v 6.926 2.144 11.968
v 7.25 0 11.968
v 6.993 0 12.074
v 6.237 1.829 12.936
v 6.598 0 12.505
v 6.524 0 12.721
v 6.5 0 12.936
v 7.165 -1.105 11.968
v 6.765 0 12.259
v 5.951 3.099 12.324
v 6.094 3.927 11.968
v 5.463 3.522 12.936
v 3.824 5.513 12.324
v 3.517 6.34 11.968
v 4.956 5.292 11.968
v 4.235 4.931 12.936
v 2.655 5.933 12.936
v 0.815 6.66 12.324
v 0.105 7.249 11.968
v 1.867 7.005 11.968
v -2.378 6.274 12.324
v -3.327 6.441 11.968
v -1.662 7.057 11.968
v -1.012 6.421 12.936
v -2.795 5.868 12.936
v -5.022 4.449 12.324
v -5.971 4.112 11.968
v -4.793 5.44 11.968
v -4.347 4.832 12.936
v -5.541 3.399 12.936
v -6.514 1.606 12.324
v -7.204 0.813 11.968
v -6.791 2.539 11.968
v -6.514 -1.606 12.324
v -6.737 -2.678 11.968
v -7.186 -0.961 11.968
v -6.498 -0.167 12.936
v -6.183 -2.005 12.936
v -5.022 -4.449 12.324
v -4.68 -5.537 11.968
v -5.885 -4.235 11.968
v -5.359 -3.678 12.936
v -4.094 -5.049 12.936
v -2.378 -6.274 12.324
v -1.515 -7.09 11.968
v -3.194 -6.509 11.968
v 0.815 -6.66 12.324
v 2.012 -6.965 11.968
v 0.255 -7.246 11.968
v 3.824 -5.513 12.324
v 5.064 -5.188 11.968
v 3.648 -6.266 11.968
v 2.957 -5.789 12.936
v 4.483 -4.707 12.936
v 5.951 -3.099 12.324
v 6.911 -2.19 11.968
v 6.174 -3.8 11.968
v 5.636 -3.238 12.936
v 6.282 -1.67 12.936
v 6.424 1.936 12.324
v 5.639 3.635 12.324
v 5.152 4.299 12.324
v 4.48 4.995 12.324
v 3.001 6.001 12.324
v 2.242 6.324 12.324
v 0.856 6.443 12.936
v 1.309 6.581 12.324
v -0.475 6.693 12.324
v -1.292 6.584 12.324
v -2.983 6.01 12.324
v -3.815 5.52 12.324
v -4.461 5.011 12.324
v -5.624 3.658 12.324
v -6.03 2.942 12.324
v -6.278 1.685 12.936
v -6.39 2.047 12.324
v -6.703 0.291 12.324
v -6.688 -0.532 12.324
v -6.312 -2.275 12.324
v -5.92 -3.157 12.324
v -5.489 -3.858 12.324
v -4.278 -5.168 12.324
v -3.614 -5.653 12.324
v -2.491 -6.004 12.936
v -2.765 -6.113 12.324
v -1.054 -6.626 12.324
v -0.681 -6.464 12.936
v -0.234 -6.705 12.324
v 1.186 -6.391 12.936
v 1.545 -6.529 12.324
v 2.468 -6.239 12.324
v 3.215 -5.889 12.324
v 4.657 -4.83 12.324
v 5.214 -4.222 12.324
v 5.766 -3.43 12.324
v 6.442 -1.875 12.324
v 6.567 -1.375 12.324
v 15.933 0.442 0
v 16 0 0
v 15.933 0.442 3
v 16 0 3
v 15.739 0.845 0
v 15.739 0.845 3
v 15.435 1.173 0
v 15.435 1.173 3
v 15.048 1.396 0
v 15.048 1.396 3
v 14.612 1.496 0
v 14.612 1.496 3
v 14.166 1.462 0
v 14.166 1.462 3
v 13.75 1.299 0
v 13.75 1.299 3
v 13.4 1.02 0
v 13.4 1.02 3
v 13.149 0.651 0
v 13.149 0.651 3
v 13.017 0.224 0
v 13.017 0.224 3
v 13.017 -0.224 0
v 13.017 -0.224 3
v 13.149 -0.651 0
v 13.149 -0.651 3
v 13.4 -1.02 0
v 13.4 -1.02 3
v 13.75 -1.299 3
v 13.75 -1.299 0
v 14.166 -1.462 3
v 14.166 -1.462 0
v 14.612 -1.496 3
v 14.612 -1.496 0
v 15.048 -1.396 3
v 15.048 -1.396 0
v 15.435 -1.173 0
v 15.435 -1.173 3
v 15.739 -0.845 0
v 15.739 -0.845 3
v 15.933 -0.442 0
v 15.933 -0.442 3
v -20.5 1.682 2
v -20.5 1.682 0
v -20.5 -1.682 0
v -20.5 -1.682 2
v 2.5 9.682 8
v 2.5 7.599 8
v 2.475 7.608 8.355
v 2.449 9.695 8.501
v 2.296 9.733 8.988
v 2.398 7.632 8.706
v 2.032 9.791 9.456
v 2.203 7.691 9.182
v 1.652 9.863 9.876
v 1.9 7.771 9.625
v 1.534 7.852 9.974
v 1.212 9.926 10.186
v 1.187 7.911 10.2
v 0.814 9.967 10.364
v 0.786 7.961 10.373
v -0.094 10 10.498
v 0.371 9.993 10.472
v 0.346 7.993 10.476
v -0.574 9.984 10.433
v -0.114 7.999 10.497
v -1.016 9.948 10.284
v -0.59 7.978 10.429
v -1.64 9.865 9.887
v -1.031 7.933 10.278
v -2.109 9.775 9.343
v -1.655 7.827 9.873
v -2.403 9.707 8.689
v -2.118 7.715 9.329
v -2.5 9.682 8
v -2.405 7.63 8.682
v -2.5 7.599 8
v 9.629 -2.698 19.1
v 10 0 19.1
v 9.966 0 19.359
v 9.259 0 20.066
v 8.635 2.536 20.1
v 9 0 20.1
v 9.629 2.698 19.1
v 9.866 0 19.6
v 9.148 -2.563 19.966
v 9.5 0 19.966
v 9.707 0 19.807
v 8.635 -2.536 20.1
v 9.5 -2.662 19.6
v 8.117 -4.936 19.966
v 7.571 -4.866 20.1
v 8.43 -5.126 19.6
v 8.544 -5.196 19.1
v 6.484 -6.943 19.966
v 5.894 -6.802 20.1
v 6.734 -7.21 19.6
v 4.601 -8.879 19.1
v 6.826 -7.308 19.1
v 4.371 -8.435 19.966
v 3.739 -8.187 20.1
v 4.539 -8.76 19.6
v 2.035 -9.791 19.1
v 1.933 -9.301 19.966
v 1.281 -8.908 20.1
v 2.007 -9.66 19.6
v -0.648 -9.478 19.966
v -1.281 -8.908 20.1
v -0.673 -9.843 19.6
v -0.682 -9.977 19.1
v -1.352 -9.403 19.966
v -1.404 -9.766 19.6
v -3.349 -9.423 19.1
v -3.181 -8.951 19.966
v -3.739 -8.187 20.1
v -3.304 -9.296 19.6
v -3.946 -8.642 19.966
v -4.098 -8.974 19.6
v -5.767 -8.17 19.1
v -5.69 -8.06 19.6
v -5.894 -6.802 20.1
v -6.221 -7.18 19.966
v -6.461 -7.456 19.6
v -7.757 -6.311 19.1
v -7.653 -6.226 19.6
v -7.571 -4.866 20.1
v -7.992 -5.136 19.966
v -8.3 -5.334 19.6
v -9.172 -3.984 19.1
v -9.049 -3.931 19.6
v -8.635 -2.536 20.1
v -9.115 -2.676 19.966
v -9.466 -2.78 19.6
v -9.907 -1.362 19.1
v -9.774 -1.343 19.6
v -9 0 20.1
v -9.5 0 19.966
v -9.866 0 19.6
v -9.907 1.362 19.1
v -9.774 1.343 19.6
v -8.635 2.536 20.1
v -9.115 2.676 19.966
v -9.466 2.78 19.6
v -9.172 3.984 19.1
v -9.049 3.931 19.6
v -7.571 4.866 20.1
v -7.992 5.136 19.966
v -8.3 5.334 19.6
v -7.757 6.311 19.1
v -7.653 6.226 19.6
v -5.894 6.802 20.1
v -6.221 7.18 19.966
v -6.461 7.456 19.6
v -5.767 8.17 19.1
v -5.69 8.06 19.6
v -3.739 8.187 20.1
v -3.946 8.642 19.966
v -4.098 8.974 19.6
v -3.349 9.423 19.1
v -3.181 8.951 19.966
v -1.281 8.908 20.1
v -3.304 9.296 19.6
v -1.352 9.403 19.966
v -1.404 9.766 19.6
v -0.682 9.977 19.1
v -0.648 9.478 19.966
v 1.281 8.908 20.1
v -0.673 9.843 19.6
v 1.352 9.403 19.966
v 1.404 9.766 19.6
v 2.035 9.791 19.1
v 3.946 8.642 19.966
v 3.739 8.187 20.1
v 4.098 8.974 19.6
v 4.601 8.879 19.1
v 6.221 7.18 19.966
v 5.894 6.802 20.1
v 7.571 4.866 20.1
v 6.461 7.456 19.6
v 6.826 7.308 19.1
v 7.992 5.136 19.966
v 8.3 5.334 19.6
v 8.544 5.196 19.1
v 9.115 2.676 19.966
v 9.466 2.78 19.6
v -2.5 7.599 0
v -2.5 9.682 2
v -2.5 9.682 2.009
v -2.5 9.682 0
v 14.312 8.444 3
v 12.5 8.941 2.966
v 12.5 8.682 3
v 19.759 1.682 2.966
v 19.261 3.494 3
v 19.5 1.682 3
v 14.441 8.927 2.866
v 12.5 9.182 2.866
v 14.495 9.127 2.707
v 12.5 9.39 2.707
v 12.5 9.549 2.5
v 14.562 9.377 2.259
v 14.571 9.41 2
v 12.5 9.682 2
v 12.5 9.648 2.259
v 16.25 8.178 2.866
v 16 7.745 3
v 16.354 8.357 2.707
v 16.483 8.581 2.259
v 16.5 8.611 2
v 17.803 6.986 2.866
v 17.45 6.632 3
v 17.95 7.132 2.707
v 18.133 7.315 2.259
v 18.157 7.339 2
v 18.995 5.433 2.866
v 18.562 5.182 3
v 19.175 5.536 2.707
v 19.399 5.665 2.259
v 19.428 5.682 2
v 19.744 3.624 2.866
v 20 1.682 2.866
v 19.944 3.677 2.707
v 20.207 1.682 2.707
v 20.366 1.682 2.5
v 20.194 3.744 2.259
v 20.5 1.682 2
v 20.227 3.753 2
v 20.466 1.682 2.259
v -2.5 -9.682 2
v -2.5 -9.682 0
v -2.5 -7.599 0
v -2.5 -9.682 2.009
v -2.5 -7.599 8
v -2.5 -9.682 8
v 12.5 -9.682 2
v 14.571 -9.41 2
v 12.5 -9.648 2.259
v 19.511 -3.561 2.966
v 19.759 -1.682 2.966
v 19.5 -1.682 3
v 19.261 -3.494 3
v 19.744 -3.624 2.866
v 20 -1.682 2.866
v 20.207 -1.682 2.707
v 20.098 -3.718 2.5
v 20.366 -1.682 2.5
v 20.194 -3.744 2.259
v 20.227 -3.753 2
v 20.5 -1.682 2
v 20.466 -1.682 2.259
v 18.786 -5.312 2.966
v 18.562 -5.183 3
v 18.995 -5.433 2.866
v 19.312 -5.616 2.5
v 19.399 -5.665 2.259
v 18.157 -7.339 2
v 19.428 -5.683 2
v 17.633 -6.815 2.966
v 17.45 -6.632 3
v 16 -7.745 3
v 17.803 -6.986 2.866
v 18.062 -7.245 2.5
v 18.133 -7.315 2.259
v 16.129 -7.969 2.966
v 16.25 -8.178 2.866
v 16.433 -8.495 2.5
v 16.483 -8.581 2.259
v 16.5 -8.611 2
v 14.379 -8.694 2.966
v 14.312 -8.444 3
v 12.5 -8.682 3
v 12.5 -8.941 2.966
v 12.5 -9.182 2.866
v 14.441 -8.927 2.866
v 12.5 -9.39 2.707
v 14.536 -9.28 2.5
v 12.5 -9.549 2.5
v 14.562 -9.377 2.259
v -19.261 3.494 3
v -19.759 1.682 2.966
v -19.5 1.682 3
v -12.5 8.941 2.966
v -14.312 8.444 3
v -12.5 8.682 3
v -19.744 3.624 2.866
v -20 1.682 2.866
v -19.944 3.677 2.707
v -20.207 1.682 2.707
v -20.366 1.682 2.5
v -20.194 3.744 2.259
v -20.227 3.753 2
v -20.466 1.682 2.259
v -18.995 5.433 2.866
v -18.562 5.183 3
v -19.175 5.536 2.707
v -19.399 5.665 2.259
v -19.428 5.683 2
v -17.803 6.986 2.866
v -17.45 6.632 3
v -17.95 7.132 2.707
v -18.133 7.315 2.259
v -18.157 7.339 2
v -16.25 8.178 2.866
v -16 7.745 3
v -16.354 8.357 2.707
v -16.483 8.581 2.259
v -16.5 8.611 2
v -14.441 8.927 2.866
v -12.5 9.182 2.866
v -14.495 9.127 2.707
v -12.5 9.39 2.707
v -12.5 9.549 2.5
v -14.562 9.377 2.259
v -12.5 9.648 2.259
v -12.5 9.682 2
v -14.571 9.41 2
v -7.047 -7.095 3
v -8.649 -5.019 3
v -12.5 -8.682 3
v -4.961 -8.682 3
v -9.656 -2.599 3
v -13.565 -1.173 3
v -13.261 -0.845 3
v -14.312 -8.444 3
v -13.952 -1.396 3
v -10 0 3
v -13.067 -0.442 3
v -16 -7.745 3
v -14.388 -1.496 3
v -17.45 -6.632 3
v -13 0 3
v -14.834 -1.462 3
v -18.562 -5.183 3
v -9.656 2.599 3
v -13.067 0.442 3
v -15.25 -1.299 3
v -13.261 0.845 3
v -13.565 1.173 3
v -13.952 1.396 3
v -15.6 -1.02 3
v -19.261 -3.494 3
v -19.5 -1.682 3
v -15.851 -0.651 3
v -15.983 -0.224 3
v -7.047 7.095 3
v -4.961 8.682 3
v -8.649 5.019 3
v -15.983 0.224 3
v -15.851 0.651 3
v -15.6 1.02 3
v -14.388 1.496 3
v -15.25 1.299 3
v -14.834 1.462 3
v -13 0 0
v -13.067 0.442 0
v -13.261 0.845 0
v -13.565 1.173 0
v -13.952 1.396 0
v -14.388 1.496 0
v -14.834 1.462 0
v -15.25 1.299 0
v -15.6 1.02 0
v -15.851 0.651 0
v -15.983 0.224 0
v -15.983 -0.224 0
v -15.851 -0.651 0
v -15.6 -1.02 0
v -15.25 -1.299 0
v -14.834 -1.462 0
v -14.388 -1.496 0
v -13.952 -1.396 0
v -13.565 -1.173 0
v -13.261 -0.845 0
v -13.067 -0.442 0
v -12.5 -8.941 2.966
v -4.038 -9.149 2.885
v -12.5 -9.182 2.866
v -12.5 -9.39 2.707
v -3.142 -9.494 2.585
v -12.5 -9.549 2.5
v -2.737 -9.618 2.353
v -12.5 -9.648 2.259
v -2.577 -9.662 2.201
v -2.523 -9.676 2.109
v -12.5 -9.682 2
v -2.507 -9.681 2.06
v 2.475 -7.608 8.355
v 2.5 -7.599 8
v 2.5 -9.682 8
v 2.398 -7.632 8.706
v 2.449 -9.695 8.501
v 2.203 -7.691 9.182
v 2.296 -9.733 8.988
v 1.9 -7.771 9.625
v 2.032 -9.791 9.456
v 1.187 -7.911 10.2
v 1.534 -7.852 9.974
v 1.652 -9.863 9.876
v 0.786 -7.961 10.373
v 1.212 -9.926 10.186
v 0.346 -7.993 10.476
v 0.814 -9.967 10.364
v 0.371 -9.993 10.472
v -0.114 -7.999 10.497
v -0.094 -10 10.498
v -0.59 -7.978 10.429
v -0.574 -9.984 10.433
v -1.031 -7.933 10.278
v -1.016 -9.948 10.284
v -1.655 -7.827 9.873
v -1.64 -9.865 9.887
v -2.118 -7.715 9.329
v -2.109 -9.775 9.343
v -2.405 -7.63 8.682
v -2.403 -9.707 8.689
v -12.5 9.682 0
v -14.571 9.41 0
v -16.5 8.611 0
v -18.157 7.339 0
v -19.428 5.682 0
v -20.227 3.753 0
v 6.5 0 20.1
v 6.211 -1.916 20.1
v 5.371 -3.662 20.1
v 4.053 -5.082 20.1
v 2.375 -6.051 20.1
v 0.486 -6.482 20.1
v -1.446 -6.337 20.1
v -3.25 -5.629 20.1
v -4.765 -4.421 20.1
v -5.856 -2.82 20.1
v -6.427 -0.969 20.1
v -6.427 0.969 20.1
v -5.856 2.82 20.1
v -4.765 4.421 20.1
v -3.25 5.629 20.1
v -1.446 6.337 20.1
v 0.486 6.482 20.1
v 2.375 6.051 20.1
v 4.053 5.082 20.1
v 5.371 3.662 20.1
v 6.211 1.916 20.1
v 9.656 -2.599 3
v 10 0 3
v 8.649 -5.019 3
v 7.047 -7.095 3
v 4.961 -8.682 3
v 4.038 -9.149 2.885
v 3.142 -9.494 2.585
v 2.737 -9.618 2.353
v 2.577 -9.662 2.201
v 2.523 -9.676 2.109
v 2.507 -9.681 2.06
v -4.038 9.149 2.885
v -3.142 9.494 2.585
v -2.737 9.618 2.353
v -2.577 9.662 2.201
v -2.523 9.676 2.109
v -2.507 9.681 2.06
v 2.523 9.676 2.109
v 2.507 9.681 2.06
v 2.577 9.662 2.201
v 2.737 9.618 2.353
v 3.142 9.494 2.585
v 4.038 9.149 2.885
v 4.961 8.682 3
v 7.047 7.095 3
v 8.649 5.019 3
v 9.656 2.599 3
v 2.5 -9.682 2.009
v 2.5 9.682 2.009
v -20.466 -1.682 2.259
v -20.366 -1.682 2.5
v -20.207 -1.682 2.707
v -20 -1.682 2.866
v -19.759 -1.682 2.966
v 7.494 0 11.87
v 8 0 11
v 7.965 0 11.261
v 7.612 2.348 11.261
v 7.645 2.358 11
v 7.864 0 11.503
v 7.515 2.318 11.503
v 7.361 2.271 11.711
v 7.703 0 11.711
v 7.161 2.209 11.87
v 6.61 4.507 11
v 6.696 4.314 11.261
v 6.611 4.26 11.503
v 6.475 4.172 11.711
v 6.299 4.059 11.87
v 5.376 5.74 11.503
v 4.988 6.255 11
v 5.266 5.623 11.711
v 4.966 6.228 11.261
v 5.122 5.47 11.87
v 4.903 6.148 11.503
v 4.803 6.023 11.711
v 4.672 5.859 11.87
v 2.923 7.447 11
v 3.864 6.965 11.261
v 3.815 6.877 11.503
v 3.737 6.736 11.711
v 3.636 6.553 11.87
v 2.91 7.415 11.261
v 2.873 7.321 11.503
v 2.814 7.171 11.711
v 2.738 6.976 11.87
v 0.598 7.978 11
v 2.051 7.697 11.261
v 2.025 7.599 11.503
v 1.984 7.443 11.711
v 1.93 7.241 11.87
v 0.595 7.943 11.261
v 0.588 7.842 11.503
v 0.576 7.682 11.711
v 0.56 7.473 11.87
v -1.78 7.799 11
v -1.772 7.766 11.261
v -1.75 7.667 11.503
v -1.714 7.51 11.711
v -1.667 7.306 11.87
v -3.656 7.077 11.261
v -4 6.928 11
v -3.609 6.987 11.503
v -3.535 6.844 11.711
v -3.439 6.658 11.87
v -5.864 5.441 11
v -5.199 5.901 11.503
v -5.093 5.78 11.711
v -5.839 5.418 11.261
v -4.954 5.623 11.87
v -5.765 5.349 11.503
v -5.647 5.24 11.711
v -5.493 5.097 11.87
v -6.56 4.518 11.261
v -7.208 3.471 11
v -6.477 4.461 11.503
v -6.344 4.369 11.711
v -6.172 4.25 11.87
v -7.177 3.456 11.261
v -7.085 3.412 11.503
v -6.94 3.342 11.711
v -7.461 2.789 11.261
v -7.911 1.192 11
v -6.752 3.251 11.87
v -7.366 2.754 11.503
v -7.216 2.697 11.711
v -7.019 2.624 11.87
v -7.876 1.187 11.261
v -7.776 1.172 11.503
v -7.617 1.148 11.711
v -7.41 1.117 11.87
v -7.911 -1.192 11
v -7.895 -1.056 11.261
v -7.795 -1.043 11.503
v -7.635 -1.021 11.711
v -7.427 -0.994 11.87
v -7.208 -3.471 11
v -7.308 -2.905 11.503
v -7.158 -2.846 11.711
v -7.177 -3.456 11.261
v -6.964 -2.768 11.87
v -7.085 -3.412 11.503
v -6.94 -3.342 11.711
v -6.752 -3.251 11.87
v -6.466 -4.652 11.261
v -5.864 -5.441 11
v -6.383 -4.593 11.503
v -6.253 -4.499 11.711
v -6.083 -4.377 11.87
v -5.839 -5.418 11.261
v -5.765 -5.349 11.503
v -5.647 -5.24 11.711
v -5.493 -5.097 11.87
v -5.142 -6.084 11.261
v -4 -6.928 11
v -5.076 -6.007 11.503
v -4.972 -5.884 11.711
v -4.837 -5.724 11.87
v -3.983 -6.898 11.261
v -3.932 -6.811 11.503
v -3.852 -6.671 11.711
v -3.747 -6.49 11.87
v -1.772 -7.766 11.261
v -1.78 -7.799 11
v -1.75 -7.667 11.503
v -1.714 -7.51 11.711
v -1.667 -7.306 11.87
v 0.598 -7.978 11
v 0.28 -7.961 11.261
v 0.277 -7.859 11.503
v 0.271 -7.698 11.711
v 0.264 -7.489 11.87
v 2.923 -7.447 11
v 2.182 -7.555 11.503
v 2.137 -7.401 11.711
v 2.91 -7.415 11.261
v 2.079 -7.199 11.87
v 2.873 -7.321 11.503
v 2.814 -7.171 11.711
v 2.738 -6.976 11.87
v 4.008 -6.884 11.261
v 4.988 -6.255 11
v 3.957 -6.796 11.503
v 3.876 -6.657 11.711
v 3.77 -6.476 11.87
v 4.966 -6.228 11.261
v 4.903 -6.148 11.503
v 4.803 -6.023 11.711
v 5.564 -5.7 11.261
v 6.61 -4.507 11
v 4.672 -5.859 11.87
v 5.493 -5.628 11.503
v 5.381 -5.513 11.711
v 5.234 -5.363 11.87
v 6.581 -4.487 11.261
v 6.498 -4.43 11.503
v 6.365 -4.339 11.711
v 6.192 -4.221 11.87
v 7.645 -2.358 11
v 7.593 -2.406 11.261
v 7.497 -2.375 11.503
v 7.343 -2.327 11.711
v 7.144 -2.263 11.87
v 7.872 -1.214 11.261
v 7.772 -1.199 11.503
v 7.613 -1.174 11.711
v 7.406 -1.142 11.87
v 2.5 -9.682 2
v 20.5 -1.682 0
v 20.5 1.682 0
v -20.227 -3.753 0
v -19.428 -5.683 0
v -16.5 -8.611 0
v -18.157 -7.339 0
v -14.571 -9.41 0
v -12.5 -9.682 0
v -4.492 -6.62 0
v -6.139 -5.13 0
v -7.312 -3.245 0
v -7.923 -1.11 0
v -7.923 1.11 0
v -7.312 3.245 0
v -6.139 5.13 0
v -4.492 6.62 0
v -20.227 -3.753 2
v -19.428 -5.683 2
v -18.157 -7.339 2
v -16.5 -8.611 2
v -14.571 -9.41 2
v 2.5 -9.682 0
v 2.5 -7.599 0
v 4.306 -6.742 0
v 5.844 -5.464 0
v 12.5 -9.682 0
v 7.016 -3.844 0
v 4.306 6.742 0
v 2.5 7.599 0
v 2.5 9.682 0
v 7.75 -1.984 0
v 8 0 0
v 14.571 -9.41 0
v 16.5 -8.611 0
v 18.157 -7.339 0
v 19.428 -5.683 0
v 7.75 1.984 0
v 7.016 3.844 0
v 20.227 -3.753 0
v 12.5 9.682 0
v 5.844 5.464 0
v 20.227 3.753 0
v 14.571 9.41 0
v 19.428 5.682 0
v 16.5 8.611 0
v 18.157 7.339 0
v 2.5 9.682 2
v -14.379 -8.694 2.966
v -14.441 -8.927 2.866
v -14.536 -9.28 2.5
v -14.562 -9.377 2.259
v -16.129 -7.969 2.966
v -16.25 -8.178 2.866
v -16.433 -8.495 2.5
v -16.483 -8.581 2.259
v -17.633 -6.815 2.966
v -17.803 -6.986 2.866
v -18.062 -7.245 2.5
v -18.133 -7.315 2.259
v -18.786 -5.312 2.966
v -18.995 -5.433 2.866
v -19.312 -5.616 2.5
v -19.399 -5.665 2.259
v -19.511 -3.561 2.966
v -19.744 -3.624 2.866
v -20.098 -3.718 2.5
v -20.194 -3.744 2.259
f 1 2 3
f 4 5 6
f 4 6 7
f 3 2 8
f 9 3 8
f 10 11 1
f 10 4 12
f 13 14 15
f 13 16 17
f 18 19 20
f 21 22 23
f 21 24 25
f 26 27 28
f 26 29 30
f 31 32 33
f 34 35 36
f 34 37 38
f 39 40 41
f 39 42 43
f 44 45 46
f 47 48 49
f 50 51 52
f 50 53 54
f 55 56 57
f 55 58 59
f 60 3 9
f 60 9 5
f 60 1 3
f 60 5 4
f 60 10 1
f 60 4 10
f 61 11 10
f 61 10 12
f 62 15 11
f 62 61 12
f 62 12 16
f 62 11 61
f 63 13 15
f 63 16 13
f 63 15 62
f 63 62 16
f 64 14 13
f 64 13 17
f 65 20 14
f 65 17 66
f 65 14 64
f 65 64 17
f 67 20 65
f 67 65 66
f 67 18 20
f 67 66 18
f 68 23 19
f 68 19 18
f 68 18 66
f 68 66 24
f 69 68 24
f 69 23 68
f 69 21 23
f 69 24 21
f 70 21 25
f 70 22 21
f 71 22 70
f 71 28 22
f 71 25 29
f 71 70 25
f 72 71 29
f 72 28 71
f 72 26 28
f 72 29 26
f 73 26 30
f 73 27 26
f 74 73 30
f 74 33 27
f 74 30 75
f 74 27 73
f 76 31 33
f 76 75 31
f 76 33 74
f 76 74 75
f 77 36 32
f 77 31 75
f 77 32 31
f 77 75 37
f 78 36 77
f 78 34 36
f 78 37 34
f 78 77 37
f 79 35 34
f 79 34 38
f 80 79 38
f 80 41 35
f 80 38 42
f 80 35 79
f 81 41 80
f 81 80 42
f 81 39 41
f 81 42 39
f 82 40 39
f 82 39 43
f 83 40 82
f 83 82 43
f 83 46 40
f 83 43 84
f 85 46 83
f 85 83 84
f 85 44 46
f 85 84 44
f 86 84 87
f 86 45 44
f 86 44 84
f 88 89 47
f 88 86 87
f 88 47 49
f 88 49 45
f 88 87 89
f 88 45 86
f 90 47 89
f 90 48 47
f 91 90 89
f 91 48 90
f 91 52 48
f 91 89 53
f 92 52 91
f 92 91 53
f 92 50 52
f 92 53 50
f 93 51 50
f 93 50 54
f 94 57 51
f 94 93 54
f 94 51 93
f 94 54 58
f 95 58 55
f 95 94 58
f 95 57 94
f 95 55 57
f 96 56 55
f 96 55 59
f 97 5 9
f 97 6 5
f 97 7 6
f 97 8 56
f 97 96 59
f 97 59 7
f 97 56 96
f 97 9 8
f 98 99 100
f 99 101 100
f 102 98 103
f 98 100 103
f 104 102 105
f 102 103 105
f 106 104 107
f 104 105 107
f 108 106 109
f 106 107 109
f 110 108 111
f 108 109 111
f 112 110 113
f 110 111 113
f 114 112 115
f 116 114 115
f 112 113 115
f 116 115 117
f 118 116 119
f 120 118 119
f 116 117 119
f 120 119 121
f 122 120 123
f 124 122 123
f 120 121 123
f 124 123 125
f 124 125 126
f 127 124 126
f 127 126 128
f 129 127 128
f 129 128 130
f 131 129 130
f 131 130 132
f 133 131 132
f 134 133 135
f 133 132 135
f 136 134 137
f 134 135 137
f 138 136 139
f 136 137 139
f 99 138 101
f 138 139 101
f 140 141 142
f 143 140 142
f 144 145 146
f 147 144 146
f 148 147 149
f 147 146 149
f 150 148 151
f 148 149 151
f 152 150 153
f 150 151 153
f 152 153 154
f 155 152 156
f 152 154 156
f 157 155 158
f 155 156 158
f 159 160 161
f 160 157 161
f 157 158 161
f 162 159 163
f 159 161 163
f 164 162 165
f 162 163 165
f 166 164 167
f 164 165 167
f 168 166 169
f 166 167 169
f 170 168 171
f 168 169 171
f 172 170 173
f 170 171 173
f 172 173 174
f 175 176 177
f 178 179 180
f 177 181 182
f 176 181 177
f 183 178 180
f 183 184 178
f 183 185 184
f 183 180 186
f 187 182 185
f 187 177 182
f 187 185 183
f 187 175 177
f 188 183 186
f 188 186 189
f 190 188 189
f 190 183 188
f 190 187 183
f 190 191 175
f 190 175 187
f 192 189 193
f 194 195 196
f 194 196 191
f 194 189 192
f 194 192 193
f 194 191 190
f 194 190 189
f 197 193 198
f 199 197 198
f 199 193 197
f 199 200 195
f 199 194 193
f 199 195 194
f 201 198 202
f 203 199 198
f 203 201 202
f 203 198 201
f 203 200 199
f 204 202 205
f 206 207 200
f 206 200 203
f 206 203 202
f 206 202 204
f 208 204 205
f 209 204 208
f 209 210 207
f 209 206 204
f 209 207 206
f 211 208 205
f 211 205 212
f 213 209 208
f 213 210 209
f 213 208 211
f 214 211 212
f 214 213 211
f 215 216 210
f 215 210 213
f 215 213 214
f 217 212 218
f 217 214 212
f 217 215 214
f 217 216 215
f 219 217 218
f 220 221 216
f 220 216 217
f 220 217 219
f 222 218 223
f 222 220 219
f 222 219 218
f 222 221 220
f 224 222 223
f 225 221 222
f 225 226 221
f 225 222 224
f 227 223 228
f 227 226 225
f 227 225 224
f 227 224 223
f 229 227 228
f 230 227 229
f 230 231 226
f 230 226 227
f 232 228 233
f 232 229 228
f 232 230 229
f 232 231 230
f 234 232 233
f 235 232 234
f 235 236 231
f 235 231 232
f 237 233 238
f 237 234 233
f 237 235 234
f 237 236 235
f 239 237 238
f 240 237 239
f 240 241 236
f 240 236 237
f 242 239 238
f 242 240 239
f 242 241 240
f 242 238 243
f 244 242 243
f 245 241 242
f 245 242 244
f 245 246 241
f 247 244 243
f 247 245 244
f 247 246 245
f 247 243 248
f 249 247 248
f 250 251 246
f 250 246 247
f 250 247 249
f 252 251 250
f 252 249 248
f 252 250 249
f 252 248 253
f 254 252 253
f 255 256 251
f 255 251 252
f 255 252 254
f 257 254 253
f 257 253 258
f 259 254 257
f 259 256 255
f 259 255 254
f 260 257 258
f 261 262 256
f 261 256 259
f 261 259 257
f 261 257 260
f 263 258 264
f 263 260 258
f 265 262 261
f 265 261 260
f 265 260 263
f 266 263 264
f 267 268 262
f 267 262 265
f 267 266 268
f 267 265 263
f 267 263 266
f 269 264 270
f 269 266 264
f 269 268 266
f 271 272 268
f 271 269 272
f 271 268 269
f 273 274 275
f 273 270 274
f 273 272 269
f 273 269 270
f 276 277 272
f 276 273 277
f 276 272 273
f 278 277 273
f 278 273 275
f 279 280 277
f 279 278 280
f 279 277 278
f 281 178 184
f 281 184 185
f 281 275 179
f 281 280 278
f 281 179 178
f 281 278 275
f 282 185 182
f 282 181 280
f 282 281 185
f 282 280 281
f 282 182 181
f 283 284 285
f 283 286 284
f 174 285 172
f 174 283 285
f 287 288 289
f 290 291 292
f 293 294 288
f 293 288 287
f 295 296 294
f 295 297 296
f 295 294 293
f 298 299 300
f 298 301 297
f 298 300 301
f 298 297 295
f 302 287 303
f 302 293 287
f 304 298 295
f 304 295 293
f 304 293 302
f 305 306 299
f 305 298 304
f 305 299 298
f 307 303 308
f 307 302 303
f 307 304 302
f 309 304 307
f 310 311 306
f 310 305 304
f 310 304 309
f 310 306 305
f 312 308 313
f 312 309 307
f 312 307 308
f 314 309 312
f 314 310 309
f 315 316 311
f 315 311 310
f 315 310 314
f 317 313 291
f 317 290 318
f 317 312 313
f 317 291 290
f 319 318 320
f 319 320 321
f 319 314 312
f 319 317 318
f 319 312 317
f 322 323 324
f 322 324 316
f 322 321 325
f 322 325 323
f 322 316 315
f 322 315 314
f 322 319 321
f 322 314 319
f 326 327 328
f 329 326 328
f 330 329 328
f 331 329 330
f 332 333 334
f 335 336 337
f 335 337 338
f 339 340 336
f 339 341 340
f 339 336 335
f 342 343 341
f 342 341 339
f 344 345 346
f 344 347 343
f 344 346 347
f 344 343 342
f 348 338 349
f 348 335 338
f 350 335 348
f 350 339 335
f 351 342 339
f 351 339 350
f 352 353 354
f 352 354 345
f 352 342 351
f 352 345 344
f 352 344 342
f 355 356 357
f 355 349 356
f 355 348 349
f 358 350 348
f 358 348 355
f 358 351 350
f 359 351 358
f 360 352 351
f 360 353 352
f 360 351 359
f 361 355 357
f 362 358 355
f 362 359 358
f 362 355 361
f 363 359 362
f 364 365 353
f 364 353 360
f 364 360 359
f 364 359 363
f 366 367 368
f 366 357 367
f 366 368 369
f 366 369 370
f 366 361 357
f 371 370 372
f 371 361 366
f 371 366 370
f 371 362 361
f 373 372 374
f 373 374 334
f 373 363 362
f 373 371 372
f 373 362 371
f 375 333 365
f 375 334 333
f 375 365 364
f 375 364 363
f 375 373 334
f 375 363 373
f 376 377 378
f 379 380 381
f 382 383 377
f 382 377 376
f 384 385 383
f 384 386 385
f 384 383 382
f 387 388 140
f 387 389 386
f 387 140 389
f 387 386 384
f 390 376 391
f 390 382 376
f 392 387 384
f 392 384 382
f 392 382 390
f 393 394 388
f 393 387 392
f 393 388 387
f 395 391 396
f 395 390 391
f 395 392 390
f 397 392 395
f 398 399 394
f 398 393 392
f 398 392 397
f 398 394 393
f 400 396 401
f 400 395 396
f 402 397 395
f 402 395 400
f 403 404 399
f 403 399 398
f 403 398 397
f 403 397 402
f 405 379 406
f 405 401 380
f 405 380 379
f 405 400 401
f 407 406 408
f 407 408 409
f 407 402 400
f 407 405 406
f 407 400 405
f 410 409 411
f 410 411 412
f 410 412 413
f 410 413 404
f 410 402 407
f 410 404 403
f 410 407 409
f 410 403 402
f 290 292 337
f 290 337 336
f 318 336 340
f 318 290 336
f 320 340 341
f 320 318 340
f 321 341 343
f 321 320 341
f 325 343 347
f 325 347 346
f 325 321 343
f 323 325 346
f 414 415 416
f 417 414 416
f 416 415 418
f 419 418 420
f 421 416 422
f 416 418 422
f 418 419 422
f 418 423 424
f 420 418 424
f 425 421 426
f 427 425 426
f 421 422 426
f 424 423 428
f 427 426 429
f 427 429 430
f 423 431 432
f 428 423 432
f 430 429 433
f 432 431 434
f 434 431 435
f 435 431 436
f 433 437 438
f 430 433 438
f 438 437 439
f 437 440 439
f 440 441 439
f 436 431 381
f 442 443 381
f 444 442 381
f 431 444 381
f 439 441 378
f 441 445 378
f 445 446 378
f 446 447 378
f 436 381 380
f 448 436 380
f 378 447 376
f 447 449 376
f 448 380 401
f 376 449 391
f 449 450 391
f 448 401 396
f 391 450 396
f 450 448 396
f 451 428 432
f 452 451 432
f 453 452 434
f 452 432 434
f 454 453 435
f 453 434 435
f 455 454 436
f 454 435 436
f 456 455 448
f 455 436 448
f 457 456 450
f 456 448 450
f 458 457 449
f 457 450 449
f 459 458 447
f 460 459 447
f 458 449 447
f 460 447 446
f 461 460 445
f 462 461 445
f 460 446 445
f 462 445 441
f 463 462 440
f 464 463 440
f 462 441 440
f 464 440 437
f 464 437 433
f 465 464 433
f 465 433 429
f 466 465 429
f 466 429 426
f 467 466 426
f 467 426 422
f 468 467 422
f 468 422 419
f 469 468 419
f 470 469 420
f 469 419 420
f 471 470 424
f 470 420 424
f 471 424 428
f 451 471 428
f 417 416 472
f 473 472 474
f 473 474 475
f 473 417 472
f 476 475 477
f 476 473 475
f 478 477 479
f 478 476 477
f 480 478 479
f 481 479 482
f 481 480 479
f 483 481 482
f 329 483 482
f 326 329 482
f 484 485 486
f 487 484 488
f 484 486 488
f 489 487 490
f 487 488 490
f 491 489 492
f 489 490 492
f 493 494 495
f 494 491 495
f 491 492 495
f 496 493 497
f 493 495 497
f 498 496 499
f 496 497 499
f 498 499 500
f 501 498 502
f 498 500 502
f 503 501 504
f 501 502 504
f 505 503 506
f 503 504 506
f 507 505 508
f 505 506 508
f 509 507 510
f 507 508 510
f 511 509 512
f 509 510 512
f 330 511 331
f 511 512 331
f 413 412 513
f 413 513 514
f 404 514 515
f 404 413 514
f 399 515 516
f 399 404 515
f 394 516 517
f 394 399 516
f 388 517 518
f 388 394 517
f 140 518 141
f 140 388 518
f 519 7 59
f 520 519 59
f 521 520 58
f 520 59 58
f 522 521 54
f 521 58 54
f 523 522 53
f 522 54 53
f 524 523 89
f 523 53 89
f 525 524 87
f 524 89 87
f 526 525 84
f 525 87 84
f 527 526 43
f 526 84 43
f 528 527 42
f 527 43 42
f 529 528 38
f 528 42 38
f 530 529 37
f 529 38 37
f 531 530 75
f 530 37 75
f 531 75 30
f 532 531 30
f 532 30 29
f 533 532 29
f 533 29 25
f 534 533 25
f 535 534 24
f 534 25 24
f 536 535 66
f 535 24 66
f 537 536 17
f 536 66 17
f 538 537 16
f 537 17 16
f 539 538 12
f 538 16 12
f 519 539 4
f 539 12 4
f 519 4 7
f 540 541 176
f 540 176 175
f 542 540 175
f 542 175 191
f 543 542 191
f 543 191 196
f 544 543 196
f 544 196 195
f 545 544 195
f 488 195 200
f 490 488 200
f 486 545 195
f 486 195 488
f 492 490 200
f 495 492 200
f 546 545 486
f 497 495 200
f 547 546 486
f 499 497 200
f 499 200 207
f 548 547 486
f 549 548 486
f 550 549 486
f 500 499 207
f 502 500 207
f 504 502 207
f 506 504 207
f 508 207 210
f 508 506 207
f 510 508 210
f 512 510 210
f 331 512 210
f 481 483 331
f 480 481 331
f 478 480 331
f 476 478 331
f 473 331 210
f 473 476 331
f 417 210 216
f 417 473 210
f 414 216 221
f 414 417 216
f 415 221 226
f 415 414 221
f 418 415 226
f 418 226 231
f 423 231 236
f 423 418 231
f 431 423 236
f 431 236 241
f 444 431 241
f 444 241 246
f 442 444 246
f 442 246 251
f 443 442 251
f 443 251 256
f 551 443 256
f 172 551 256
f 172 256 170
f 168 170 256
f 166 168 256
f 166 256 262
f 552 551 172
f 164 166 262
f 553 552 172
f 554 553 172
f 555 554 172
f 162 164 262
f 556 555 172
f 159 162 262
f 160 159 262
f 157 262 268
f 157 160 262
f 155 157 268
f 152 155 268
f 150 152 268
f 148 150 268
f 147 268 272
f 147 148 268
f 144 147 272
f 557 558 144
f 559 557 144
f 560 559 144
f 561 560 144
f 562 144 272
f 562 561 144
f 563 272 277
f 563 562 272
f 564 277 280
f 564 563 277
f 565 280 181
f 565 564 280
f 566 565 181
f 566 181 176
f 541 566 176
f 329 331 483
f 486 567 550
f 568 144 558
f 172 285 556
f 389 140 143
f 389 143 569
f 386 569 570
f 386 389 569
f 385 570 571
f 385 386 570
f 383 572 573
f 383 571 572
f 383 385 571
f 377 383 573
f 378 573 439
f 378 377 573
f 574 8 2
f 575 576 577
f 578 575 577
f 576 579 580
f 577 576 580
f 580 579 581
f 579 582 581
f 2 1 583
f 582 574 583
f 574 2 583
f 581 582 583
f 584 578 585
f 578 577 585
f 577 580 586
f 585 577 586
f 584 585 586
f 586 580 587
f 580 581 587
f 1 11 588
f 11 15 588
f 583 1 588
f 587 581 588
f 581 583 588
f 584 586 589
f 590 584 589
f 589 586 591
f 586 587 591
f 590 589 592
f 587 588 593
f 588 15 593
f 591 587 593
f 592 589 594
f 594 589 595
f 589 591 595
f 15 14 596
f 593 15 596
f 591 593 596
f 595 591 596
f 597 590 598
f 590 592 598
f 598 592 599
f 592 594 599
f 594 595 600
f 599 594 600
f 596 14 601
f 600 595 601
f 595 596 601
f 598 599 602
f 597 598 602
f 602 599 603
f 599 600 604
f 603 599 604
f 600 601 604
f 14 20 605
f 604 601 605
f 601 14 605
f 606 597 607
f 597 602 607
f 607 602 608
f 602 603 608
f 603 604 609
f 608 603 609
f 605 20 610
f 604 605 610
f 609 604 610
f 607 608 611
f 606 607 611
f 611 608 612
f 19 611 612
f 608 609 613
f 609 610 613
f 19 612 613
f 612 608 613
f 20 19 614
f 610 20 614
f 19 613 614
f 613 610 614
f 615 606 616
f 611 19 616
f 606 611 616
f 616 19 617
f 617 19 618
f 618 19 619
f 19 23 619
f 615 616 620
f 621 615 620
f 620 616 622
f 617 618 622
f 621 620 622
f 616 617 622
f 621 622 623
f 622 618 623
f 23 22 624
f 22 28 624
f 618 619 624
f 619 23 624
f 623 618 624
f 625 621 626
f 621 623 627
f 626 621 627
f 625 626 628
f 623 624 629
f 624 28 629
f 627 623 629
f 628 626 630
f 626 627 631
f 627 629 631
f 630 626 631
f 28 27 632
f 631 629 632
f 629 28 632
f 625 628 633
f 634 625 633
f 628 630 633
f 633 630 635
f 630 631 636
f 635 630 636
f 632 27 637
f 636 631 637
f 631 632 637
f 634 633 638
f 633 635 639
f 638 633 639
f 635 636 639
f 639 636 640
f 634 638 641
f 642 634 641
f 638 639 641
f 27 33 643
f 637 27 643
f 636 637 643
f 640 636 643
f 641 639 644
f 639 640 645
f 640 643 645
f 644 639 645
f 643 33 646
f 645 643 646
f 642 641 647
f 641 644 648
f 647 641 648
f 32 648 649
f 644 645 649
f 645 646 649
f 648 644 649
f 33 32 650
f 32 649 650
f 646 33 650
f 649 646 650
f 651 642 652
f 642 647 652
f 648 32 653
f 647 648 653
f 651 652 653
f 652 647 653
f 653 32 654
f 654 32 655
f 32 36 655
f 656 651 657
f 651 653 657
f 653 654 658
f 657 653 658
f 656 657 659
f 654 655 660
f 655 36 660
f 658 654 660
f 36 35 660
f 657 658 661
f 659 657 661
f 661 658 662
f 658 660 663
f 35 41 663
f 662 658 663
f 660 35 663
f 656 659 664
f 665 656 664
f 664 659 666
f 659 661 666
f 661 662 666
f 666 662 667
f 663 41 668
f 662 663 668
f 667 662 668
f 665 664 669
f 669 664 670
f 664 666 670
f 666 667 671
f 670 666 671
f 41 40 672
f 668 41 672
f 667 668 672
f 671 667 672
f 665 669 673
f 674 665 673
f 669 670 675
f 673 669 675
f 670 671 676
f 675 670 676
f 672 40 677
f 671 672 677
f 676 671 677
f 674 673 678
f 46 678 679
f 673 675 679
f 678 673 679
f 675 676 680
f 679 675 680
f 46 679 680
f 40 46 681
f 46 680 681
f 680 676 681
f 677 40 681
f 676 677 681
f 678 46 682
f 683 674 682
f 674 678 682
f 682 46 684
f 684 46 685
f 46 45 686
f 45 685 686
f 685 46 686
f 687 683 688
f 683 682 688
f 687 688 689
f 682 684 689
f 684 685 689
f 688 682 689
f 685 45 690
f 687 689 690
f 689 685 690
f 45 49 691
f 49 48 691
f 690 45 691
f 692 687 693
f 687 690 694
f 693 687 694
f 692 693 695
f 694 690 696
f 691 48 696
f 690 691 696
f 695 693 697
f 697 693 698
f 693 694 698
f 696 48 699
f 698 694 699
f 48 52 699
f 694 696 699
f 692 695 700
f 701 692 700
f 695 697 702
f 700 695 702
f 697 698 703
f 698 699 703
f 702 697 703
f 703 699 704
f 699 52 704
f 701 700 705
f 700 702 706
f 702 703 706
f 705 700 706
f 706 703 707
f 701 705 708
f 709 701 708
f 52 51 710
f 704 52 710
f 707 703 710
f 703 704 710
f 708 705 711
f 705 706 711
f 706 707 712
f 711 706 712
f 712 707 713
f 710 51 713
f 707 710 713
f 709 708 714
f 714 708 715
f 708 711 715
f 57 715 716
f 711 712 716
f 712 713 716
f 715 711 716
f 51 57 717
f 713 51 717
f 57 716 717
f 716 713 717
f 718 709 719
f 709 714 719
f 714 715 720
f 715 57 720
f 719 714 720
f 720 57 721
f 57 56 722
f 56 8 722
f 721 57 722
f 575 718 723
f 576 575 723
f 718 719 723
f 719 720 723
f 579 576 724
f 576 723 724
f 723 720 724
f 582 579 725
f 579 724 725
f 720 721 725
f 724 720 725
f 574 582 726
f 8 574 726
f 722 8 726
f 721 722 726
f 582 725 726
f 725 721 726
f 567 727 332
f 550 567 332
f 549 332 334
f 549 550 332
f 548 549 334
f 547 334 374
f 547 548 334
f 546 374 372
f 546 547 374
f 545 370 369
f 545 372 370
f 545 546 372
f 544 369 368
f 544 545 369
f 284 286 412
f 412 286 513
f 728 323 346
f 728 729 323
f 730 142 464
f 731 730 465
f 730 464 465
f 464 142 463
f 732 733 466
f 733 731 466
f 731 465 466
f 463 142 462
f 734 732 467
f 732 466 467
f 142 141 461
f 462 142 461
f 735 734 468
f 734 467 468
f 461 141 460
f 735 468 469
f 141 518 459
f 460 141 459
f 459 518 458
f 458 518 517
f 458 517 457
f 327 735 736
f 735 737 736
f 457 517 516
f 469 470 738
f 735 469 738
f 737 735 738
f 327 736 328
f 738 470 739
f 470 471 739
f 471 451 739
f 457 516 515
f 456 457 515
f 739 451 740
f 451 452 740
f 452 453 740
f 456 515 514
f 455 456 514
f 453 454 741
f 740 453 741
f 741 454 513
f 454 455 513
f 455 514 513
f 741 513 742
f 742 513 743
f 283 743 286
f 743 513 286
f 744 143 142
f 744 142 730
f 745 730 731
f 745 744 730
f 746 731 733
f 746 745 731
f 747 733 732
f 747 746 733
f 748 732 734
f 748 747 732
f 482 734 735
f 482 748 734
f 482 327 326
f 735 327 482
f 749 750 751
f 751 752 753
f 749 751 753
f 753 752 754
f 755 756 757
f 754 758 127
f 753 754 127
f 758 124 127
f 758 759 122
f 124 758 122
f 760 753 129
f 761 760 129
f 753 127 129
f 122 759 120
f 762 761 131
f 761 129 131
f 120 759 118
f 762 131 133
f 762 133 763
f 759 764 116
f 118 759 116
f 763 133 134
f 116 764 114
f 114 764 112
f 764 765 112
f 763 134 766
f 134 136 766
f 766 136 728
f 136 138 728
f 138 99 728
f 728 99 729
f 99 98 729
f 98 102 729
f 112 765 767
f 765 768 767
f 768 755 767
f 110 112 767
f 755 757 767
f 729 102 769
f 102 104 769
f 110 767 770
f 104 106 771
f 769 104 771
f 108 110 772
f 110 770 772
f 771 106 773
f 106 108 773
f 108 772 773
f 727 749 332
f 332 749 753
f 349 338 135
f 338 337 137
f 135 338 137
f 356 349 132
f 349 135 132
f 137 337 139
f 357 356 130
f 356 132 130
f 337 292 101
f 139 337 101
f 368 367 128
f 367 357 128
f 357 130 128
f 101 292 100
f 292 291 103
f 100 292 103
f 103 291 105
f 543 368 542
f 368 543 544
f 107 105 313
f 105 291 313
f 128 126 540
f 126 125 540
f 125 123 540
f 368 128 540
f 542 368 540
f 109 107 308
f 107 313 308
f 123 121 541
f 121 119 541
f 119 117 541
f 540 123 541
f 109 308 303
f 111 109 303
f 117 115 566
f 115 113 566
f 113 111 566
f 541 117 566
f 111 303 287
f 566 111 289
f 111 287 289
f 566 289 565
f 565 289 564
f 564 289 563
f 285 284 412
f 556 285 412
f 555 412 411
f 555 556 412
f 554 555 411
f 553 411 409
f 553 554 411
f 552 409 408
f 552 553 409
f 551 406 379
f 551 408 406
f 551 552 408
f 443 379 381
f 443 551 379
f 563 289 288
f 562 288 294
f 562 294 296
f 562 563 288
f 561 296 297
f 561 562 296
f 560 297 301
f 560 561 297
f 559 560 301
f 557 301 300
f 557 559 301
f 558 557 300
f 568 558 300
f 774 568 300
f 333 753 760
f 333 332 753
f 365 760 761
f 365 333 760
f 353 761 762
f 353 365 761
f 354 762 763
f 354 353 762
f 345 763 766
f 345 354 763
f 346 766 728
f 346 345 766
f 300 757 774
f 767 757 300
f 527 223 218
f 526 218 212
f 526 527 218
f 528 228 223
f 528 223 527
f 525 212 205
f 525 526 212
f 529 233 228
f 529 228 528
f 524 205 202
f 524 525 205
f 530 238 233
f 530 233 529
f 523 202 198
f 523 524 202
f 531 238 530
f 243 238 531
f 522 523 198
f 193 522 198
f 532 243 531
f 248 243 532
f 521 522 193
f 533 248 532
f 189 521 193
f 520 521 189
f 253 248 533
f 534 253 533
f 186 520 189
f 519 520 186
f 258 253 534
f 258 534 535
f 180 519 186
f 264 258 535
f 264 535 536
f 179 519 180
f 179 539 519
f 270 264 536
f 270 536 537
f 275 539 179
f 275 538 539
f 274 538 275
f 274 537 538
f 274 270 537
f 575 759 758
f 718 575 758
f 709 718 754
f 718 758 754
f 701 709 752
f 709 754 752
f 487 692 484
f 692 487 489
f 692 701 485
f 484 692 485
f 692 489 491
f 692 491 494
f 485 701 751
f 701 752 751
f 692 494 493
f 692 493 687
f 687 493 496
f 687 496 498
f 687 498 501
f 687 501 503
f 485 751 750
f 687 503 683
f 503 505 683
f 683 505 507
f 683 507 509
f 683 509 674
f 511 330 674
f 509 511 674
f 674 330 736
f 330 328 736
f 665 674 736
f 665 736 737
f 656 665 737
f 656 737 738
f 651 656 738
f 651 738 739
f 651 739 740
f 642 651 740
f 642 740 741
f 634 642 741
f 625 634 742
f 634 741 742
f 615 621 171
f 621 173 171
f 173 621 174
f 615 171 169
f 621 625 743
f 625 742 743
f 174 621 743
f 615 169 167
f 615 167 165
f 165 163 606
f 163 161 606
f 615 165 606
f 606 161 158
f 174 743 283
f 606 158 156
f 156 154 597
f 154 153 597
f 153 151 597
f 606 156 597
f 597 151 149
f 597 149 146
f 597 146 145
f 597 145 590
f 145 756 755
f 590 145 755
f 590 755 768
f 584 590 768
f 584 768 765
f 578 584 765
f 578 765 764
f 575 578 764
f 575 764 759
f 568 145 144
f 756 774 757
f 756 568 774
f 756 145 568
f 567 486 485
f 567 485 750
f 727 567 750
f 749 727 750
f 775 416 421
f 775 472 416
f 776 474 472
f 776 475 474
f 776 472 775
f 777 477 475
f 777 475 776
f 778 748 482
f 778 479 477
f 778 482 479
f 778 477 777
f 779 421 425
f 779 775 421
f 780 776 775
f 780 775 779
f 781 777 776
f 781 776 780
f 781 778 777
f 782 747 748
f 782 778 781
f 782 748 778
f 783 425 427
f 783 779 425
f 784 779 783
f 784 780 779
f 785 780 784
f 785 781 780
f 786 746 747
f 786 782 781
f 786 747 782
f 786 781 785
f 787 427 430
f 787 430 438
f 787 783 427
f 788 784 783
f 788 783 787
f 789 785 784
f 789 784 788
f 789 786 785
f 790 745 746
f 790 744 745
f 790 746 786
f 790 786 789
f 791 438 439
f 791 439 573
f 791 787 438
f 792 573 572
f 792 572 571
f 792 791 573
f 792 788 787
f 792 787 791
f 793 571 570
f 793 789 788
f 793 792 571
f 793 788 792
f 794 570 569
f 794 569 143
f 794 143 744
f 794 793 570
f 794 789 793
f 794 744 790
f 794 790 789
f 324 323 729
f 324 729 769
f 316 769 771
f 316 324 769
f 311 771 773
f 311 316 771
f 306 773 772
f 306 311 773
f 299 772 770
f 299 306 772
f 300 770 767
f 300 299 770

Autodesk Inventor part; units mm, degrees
ref_plane "YZ Plane" through (0, 0, 0) normal (1, 0, 0) x (0, 1, 0)
ref_plane "XZ Plane" through (0, 0, 0) normal (0, 1, 0) x (-1, 0, 0)
ref_plane "XY Plane" through (0, 0, 0) normal (0, 0, 1) x (1, 0, 0)
sketch "スケッチ1" plane through (0, 0, 0) normal (0, 0, 1) x (1, 0, 0)
  circle A0 centre (0, 0) radius 8
  circle A1 centre (0, 0) radius 10
  dimension "d0" = 16
  dimension "d1" = 2
extrude "押し出し1" add sketch "スケッチ1" along normal blind 12
sketch "スケッチ2" plane through (0, 0, 12) normal (0, 0, 1) x (1, 0, 0)
  circle A0 centre (0, 0) radius 6.5
  circle A1 centre (0, 0) radius 10 projected
  circle A2 centre (0, 0) radius 10
  dimension "d4" = 13
extrude "押し出し2" add sketch "スケッチ2" along normal blind 8.1
sketch "スケッチ3" plane through (0, 0, 0) normal (0, 1, 0) x (-1, 0, 0)
  line L0 (10, 0) -> (-10, 0) projected
  line L1 (2.5, 0) -> (2.5, 8)
  arc A0 (2.5, 8) -> (-2.5, 8) centre (0, 8) ccw
  line L2 (-2.5, 8) -> (-2.5, 0)
  line L3 (2.5, 0) -> (-2.5, 0)
  line L4 (0, -2.1) -> (0, 12.6) projected
  point P0 (0, 0)
  dimension "d7" = 5
  dimension "d8" = 8
extrude "押し出し3" cut sketch "スケッチ3" along normal through all both and the other way through all
fillet "フィレット1" radius 1 2 edges at (-8, 0, 12) (-6.5, 0, 12)
fillet "フィレット2" radius 1 1 edges at (-10, 0, 20.1)
sketch "スケッチ4" plane through (0, 0, 0) normal (0, 0, -1) x (-1, 0, 0)
  line L0 (2.5, -9.6825) -> (2.5, -7.5993) projected
  line L1 (2.5, -9.6825) -> (20.5, -9.6825)
  circle A0 centre (0, 0) radius 10 projected
  line L2 (2.5, 9.6825) -> (20.5, 9.6825)
  line L3 (20.5, 9.6825) -> (20.5, -9.6825)
  line L4 (2.5, 7.5993) -> (2.5, 9.6825) projected
  arc A1 (2.5, -9.6825) -> (2.5, 9.6825) centre (0, 0) ccw
  line L5 (0, -14) -> (0, 14) projected
  line L6 (-2.5, -9.6825) -> (-20.5, -9.6825)
  line L7 (-2.5, 9.6825) -> (-20.5, 9.6825)
  line L8 (-20.5, 9.6825) -> (-20.5, -9.6825)
  arc A2 (-2.5, 9.6825) -> (-2.5, -9.6825) centre (0, 0) ccw
  point P0 (-2.5, -9.6825)
  dimension "d13" = 18
extrude "押し出し4" add sketch "スケッチ4" against normal blind 3 contours A0 L2 L3 L1 | L6 L8 L7 A0
fillet "フィレット3" radius 8 4 edges at (20.5, 9.6825, 1.5) (20.5, -9.6825, 1.5) (-20.5, -9.6825, 1.5) (-20.5, 9.6825, 1.5)
fillet "フィレット4" radius 1 10 edges at (-18.1569, -7.3393, 3) (-7.5, -9.6825, 3) (-18.1569, 7.3393, 3) (-7.5, 9.6825, 3) (-20.5, 0, 3) (18.1569, 7.3393, 3) (7.5, 9.6825, 3) (18.1569, -7.3393, 3) (7.5, -9.6825, 3) (20.5, 0, 3)
sketch "スケッチ5" plane through (0, 0, 3) normal (0, 0, 1) x (1, 0, 0)
  circle A0 centre (14.5, 0) radius 1.5
  circle A1 centre (0, 0) radius 10 projected
  line L0 (-28.7, 0) -> (28.7, 0) projected
  line L1 (0, -14.0024) -> (0, 14.0024) projected
  circle A2 centre (-14.5, 0) radius 1.5
  dimension "d18" = 3
  dimension "d19" = 3
extrude "押し出し5" cut sketch "スケッチ5" against normal through all contours L0 A0 | A0 L0 | A2 L0 | L0 A2
properties part number "cover.ver1"
